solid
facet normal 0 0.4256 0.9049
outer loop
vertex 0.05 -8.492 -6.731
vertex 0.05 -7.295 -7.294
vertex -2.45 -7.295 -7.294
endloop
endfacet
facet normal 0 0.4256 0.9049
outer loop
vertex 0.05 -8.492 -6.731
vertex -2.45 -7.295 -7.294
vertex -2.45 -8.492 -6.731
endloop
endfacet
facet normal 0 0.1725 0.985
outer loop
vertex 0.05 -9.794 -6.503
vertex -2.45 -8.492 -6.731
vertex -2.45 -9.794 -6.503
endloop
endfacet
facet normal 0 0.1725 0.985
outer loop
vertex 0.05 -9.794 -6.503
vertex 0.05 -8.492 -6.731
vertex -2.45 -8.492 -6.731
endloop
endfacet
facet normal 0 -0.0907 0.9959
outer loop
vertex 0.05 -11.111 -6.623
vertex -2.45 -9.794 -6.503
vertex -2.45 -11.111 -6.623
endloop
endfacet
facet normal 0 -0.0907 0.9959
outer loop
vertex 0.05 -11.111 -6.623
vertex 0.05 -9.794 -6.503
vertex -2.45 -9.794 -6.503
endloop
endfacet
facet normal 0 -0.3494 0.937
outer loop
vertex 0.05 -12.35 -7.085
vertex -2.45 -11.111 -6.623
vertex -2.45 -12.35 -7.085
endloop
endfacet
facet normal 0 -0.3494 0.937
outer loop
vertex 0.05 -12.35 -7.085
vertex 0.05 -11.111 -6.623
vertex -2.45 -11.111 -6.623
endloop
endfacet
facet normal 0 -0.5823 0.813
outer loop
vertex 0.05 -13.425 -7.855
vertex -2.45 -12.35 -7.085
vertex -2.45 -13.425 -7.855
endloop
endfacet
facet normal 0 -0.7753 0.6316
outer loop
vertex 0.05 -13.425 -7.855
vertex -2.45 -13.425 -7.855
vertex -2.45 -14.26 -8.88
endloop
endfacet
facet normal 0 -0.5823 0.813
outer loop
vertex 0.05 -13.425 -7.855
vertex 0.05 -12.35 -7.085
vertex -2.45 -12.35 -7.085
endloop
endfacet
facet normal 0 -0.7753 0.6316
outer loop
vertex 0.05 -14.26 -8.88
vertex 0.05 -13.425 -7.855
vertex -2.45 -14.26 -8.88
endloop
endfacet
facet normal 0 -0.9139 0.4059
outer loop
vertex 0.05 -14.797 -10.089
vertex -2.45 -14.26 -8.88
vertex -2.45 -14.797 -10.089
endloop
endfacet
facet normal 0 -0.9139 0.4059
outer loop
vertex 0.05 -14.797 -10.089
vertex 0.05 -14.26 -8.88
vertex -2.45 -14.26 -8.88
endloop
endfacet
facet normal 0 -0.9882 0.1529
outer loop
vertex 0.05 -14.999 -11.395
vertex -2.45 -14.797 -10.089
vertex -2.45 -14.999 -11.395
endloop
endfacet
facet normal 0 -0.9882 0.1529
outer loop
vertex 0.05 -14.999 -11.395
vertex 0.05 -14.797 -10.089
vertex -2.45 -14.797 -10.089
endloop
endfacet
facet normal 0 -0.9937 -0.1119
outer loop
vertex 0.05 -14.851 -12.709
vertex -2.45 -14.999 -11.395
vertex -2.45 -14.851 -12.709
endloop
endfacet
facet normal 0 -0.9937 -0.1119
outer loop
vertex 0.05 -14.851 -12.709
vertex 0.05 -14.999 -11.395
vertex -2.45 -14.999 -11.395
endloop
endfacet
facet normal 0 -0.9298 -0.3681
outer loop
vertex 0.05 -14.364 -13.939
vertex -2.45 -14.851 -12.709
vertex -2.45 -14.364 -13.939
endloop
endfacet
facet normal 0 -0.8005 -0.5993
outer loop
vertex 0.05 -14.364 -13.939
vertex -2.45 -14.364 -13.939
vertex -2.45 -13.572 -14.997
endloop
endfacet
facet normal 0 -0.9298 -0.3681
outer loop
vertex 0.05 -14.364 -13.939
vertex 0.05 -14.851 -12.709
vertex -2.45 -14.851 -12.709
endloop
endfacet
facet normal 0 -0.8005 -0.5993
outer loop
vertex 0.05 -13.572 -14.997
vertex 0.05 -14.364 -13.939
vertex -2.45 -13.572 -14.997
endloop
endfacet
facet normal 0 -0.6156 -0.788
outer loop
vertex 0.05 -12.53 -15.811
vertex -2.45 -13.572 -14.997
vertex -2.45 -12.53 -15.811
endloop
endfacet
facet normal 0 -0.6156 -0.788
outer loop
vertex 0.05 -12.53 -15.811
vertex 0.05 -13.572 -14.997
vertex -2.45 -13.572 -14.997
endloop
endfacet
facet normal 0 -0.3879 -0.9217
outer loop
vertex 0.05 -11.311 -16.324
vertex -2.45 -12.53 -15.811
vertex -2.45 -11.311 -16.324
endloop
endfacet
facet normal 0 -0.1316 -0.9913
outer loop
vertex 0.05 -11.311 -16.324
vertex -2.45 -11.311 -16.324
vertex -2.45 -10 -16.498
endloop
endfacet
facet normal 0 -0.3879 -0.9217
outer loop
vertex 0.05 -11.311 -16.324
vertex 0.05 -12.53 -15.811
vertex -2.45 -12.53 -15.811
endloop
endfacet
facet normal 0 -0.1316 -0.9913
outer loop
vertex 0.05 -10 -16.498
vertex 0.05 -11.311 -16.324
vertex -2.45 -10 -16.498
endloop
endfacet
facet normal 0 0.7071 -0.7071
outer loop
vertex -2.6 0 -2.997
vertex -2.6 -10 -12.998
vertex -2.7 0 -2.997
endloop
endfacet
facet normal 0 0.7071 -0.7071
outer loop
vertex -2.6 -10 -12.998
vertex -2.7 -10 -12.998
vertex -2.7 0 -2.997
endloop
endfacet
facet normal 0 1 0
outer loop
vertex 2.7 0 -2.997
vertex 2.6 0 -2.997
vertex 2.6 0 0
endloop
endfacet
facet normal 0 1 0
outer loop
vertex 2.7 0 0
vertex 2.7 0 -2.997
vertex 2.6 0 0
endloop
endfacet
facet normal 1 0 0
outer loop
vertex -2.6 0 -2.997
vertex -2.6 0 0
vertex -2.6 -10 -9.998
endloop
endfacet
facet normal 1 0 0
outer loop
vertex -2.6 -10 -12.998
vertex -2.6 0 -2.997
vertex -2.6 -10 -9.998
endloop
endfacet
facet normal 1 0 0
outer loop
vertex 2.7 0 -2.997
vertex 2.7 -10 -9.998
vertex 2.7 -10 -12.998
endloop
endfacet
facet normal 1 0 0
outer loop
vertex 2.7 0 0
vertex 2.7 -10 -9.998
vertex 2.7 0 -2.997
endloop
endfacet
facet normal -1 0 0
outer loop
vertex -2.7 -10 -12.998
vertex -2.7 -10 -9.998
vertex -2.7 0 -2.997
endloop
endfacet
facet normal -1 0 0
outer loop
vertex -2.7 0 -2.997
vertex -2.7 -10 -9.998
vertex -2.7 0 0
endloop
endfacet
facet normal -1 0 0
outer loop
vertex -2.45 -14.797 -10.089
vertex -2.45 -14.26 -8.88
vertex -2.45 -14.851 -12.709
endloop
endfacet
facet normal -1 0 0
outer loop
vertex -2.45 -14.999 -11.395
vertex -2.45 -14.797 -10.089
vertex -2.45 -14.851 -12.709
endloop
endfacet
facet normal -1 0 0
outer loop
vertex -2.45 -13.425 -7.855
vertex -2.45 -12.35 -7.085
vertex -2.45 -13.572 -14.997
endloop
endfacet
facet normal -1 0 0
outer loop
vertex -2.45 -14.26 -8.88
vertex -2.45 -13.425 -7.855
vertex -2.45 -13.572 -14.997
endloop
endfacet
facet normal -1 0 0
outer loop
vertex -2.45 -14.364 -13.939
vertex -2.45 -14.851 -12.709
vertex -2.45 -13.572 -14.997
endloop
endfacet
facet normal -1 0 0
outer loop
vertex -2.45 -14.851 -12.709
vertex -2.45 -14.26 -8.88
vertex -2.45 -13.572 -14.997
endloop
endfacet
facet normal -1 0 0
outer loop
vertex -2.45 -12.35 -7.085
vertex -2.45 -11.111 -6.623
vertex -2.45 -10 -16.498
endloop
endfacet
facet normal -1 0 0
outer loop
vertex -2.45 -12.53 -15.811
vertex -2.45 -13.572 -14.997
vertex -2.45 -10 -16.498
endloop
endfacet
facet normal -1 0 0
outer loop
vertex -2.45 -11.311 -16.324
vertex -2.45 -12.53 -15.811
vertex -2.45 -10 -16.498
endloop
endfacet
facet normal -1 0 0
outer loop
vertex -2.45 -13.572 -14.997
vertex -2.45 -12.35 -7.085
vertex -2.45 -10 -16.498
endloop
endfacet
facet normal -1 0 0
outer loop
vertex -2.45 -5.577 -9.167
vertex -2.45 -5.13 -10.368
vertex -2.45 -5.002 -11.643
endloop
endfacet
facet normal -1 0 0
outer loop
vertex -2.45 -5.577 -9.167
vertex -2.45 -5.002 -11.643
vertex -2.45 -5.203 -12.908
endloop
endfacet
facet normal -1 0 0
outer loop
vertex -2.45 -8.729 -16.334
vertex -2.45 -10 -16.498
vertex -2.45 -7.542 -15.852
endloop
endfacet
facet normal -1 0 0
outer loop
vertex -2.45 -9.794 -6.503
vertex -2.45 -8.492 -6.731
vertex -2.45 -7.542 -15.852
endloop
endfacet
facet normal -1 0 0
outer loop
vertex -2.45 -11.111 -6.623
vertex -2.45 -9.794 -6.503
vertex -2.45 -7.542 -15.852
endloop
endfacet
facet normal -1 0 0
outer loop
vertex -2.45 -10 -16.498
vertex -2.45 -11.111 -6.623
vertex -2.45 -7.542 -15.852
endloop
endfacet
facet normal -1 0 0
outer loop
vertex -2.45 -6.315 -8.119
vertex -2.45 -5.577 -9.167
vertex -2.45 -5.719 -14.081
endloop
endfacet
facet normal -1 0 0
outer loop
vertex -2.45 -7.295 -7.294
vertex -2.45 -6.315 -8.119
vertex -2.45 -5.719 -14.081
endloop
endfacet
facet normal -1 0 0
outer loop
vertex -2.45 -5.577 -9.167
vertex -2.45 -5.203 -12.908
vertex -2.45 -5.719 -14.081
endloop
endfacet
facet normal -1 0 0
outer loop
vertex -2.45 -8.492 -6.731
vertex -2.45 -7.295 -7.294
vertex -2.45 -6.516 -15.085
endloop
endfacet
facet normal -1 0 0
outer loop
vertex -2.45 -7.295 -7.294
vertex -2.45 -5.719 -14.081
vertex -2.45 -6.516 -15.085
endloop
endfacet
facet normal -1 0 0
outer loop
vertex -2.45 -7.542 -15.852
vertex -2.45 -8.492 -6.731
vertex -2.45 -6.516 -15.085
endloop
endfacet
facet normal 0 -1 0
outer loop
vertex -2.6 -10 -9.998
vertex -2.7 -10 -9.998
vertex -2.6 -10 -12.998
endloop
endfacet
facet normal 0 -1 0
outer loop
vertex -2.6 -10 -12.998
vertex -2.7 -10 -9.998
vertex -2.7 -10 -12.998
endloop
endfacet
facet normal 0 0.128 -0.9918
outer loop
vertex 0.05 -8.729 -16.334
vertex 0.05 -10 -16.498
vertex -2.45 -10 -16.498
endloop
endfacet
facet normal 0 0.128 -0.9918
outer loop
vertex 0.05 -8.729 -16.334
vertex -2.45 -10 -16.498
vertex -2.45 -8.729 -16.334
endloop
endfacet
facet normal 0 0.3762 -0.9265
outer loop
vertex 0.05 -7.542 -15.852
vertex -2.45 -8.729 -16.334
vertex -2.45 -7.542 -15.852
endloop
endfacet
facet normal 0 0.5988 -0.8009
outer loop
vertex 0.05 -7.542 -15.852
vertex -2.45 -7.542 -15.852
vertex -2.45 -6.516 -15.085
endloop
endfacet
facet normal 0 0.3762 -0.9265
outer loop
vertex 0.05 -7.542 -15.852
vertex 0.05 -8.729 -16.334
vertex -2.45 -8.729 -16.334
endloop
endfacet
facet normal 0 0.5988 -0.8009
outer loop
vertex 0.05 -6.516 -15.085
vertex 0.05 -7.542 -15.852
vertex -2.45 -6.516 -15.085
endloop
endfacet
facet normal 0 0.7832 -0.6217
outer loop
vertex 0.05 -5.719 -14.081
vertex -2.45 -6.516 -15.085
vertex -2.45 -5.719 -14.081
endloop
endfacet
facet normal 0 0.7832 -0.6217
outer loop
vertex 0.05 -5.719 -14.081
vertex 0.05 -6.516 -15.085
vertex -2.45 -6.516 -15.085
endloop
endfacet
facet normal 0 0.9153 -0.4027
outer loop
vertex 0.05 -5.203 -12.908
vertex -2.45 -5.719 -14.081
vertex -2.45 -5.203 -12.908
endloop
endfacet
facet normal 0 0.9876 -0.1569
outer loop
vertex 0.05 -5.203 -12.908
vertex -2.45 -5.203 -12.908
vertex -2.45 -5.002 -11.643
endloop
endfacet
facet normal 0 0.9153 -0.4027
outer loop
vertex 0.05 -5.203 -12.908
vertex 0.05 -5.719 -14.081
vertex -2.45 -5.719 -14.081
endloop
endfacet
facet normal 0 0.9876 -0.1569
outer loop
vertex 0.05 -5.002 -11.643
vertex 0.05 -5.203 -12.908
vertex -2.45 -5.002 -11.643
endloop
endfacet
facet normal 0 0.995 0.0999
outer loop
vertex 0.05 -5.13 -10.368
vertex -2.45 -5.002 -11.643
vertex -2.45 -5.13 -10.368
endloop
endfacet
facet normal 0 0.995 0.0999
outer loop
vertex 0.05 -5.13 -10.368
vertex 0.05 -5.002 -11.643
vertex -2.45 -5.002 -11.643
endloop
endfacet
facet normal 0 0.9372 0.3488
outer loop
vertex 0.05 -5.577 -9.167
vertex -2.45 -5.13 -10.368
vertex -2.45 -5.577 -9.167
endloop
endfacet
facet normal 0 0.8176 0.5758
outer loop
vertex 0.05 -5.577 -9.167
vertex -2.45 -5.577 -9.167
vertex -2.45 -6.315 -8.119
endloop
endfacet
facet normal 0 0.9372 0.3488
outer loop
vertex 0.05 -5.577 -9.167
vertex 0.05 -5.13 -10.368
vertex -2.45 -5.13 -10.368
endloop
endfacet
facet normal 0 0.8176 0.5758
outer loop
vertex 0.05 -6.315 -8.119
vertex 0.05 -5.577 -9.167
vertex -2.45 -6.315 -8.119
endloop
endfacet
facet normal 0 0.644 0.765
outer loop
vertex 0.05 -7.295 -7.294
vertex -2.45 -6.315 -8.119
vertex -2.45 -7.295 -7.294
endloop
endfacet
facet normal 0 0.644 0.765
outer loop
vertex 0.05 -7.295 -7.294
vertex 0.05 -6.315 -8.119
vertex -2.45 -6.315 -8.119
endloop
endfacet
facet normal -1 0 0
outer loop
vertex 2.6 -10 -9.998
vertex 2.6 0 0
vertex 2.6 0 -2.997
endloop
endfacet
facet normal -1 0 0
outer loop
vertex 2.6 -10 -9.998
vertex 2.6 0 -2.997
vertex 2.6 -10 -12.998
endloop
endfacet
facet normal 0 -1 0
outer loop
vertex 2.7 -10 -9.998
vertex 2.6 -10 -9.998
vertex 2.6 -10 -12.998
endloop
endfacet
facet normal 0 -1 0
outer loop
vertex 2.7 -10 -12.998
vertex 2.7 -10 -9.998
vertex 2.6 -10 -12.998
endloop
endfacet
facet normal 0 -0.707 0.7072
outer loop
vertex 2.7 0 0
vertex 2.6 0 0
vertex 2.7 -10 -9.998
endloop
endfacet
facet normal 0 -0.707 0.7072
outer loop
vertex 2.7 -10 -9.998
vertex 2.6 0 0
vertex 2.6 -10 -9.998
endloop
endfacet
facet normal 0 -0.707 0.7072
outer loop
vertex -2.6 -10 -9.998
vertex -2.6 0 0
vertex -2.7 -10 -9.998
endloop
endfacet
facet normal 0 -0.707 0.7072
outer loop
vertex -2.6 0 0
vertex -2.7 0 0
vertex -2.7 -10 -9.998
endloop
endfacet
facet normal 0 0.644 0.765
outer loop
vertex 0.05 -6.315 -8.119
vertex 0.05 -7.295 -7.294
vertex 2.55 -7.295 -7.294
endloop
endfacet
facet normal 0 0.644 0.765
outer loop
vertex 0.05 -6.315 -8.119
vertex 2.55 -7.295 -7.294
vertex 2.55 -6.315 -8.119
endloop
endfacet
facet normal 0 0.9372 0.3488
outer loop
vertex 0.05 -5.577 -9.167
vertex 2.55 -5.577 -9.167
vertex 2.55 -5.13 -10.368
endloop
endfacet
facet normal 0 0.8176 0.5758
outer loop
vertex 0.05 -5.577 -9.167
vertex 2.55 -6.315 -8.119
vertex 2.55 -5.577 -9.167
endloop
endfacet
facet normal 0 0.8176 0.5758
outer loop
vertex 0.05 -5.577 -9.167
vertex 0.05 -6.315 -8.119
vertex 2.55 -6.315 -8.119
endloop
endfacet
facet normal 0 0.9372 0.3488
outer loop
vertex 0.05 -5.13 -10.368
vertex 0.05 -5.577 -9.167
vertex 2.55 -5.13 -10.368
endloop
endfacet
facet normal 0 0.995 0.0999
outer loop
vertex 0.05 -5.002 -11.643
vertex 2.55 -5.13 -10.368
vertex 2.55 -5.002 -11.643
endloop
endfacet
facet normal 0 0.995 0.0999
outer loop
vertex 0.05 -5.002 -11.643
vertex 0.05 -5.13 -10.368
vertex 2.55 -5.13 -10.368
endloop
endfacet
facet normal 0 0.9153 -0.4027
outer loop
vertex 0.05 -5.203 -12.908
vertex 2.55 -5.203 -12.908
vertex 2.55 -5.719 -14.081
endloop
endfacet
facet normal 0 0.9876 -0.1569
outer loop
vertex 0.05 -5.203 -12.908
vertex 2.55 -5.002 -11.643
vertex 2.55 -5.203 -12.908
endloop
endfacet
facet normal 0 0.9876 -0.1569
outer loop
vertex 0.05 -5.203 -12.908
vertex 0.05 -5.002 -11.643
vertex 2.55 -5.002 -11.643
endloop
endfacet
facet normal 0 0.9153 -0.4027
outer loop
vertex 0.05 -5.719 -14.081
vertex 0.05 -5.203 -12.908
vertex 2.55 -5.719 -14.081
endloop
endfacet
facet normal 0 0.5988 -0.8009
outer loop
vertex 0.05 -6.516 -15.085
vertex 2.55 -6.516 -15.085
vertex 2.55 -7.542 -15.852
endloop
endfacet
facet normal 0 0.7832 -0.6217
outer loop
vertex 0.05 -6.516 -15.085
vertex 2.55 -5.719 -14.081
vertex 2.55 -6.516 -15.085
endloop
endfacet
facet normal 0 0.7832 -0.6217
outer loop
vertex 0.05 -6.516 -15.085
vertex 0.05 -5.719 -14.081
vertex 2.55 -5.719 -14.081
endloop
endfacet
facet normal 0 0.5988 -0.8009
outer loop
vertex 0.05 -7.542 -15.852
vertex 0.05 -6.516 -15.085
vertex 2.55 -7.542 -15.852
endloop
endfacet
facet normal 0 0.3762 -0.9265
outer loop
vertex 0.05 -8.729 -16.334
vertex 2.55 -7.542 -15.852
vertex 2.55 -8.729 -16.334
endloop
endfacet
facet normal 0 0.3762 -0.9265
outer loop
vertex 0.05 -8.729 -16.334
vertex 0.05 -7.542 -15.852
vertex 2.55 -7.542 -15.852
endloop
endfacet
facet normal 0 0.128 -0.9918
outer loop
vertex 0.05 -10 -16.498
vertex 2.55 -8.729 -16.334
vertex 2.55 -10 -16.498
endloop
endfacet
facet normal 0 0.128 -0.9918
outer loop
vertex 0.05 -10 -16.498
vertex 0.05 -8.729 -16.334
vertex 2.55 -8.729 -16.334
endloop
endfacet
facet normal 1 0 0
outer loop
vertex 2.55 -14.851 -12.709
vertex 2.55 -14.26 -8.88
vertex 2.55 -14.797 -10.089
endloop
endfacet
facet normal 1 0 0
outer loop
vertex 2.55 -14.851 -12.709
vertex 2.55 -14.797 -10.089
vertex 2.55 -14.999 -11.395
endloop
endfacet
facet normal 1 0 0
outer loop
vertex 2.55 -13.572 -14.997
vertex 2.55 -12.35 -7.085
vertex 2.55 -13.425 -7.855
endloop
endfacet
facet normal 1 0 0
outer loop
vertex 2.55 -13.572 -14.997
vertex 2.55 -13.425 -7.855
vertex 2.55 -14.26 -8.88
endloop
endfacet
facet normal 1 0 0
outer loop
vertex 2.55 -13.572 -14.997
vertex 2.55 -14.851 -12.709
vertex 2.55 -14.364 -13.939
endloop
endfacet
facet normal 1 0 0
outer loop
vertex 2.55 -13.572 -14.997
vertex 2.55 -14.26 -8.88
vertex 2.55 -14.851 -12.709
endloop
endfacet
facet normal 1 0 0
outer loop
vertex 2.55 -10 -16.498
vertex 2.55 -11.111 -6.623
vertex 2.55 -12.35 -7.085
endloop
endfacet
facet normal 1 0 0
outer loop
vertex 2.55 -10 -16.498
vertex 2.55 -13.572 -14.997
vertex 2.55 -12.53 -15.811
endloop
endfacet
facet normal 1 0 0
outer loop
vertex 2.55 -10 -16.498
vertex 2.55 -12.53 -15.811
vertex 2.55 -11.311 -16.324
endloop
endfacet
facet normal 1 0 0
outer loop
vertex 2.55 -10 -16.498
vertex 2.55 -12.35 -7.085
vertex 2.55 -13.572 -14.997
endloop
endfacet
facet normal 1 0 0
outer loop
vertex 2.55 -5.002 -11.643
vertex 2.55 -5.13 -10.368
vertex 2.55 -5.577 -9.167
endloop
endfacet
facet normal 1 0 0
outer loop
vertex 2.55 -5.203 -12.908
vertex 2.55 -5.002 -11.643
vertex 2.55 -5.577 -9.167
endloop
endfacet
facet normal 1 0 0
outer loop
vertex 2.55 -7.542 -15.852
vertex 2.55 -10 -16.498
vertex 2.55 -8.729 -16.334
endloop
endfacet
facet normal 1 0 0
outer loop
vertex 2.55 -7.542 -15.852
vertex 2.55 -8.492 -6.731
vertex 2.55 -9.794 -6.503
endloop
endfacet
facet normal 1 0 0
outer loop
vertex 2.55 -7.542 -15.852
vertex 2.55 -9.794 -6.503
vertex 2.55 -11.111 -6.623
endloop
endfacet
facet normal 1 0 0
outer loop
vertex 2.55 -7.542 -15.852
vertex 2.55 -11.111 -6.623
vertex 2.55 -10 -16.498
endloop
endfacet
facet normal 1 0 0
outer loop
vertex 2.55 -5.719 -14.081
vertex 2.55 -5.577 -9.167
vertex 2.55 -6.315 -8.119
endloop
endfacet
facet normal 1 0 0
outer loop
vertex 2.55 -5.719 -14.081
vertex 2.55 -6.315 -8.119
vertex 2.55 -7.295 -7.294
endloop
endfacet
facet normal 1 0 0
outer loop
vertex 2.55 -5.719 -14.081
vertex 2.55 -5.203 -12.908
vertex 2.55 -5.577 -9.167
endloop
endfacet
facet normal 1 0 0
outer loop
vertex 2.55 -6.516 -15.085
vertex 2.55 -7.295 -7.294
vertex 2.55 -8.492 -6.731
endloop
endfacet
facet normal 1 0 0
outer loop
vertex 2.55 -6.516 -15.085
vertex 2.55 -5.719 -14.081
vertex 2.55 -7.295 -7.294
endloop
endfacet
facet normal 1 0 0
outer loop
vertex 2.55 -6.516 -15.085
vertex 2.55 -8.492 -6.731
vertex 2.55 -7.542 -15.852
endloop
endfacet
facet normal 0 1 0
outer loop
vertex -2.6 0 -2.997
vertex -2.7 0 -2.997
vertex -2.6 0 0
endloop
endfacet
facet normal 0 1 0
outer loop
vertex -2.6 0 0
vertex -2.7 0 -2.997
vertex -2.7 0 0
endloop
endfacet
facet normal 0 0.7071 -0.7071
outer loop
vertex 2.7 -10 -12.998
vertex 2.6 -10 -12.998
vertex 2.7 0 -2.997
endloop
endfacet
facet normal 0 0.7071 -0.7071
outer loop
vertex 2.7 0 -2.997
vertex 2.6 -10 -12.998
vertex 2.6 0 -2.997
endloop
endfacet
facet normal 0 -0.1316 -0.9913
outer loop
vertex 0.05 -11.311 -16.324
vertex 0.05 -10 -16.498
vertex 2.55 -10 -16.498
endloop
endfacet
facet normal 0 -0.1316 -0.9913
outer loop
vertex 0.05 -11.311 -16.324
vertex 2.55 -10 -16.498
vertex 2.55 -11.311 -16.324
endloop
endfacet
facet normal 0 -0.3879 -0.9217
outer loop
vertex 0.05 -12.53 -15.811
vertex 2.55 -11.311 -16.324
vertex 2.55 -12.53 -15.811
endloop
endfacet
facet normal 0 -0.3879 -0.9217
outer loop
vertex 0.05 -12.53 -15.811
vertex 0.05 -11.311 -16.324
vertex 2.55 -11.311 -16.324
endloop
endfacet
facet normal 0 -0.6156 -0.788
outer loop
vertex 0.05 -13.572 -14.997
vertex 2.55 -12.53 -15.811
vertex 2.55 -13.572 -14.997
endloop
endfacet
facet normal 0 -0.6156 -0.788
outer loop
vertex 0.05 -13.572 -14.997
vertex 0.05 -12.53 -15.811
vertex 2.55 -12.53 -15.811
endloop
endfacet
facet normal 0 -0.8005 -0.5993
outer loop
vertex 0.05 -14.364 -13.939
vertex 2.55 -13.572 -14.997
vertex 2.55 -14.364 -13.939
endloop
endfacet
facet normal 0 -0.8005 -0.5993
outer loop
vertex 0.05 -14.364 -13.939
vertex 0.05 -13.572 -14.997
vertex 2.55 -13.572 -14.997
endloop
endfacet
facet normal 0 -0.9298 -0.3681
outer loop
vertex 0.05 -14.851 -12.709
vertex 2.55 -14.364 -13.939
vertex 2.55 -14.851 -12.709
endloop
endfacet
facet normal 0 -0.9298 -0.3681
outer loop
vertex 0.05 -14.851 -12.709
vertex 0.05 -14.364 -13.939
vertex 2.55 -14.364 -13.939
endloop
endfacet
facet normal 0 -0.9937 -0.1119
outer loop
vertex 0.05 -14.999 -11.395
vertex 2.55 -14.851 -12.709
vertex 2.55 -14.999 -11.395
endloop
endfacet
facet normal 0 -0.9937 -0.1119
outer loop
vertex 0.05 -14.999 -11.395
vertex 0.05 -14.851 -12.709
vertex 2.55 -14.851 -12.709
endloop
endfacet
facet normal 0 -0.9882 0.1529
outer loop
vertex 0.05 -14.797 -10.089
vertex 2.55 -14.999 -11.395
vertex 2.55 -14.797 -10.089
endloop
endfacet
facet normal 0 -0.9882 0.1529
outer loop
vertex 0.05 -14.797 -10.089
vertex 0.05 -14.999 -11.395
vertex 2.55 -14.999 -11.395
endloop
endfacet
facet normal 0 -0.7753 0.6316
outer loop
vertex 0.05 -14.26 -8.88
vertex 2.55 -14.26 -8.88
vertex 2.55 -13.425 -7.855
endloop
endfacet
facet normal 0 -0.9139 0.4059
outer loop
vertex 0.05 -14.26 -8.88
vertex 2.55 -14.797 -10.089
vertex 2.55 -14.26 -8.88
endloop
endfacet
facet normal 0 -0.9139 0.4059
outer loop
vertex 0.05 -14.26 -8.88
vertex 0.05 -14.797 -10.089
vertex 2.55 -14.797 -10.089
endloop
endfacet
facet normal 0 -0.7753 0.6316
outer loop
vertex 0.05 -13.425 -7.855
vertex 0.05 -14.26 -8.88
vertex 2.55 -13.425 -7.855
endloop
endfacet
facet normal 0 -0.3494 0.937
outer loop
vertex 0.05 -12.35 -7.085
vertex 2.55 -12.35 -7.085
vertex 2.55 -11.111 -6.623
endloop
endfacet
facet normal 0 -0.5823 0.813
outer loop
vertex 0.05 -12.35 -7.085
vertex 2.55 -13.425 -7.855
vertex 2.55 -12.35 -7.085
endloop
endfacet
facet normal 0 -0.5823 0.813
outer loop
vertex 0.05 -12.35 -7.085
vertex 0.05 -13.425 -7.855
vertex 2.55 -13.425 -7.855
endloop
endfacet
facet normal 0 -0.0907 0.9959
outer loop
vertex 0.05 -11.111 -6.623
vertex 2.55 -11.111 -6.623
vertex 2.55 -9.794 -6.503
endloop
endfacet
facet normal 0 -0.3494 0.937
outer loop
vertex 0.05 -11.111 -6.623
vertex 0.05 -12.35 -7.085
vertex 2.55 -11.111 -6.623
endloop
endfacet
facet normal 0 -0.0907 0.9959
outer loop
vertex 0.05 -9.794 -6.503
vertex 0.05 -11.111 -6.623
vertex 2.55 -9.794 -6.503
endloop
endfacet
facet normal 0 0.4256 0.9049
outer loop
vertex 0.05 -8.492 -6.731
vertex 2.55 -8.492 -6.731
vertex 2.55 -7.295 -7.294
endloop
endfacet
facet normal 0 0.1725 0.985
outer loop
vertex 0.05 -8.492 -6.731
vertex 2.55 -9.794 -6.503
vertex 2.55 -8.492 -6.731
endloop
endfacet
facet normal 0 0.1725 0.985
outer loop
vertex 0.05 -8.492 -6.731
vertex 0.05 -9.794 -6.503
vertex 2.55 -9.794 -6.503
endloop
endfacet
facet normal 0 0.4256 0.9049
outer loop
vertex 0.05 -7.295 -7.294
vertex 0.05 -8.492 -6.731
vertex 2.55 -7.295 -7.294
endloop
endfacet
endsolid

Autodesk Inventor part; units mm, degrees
ref_plane "YZ Plane" through (0, 0, 0) normal (1, 0, 0) x (0, 1, 0)
ref_plane "XZ Plane" through (0, 0, 0) normal (0, 1, 0) x (-1, 0, 0)
ref_plane "XY Plane" through (0, 0, 0) normal (0, 0, 1) x (1, 0, 0)
sketch "Esboço1" plane through (0, 0, 0) normal (1, 0, 0) x (0, 1, 0)
  line L0 (0, 0) -> (-10, -9.9984)
  line L1 (-10, -9.9984) -> (-10, -12.9984)
  line L2 (-10, -12.9984) -> (0, -2.9974)
  line L3 (0, -2.9974) -> (0, 0)
  dimension "d5" = 3
extrude "Extrusão1" add sketch "Esboço1" along normal mid plane 5.4
sketch "Esboço2" plane through (-2.7, -10, -9.9984) normal (0, -0.7070505, 0.7071631) x (1, 0, 0)
  line L0 (0, 14.141) -> (0, 12.0217) projected
  line L1 (0.1, 14.141) -> (0.1, -2.1212)
  line L2 (5.3, 14.141) -> (5.3, -2.1212)
  line L3 (5.3, -2.1212) -> (0.1, -2.1212)
  line L4 (0.1, 14.141) -> (5.3, 14.141)
  point P0 (2.7, 14.141)
  point P1 (5.4, 14.141)
extrude "Extrusão2" cut sketch "Esboço2" against normal blind 5.4
ref_plane "Plano de trabalho1" through (0.05, 0, 0) normal (1, 0, 0) x (0, 0, -1)
sketch "Esboço3" plane through (0.05, 0, 0) normal (1, 0, 0) x (0, 0, -1)
  line L0 (0, 0) -> (9.9984, -10) projected
  line L1 (9.9984, -10) -> (12.9984, -10) projected
  circle A0 centre (11.4984, -10) radius 5
  dimension "d14" = 10
extrude "Extrusão3" add sketch "Esboço3" along normal mid plane 5
properties part number "RodaP"
